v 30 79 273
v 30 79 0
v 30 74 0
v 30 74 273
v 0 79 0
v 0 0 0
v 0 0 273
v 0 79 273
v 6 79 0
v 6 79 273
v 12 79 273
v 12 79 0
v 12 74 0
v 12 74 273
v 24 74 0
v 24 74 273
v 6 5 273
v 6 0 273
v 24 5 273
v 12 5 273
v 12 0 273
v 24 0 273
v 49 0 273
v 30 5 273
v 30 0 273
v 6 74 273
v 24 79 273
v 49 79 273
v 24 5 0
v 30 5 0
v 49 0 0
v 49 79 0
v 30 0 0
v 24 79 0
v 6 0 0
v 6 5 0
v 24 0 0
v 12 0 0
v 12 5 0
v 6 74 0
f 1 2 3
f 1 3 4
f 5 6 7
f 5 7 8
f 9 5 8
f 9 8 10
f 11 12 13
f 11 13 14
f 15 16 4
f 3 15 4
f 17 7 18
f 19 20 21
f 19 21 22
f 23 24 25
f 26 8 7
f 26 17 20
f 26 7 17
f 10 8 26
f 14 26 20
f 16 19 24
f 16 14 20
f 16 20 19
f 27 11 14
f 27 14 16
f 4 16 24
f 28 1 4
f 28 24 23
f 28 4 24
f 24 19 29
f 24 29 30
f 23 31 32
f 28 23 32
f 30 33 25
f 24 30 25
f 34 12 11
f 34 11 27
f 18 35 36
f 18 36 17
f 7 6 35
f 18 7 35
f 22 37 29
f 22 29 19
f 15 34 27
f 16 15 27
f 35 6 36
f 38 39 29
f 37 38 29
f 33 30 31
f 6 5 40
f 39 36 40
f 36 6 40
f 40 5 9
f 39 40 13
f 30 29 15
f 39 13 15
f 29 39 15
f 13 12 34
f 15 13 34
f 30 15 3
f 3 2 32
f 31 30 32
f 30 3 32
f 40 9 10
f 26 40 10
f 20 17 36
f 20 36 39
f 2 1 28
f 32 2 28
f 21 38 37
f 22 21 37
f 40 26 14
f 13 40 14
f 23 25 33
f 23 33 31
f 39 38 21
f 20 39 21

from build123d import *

# Parameters (mm, degrees)
ESQUISSE1_W             = 49
ESQUISSE1_H             = 79
BOSS_EXTRU_1_DEPTH      = 273
ESQUISSE2_W             = 6
ESQUISSE2_H             = 273
ENL_V_MAT_EXTRU_1_DEPTH = 5


with BuildPart() as part:
    # Esquisse1 → Boss.-Extru.1 (new body)
    with BuildSketch(Plane.XY):
        with Locations((24.5, 39.5)):
            Rectangle(ESQUISSE1_W, ESQUISSE1_H)
    extrude(amount=BOSS_EXTRU_1_DEPTH)

    # Esquisse2 → Enlèv. mat.-Extru.1 (cut)
    with BuildSketch(Plane.XZ):
        with Locations((9, 136.5)):
            Rectangle(ESQUISSE2_W, ESQUISSE2_H)
        with Locations((27, 136.5)):
            Rectangle(ESQUISSE2_W, ESQUISSE2_H)
    enl_v_mat_extru_1 = extrude(amount=-ENL_V_MAT_EXTRU_1_DEPTH, mode=Mode.SUBTRACT)

    # Symétrie2: Enlèv. mat.-Extru.1 across plane
    add(enl_v_mat_extru_1.mirror(Plane(origin=(0, 39.5, 0), x_dir=(0, 0, 1), z_dir=(0, -1, 0))), mode=Mode.SUBTRACT)


solid = part.part
